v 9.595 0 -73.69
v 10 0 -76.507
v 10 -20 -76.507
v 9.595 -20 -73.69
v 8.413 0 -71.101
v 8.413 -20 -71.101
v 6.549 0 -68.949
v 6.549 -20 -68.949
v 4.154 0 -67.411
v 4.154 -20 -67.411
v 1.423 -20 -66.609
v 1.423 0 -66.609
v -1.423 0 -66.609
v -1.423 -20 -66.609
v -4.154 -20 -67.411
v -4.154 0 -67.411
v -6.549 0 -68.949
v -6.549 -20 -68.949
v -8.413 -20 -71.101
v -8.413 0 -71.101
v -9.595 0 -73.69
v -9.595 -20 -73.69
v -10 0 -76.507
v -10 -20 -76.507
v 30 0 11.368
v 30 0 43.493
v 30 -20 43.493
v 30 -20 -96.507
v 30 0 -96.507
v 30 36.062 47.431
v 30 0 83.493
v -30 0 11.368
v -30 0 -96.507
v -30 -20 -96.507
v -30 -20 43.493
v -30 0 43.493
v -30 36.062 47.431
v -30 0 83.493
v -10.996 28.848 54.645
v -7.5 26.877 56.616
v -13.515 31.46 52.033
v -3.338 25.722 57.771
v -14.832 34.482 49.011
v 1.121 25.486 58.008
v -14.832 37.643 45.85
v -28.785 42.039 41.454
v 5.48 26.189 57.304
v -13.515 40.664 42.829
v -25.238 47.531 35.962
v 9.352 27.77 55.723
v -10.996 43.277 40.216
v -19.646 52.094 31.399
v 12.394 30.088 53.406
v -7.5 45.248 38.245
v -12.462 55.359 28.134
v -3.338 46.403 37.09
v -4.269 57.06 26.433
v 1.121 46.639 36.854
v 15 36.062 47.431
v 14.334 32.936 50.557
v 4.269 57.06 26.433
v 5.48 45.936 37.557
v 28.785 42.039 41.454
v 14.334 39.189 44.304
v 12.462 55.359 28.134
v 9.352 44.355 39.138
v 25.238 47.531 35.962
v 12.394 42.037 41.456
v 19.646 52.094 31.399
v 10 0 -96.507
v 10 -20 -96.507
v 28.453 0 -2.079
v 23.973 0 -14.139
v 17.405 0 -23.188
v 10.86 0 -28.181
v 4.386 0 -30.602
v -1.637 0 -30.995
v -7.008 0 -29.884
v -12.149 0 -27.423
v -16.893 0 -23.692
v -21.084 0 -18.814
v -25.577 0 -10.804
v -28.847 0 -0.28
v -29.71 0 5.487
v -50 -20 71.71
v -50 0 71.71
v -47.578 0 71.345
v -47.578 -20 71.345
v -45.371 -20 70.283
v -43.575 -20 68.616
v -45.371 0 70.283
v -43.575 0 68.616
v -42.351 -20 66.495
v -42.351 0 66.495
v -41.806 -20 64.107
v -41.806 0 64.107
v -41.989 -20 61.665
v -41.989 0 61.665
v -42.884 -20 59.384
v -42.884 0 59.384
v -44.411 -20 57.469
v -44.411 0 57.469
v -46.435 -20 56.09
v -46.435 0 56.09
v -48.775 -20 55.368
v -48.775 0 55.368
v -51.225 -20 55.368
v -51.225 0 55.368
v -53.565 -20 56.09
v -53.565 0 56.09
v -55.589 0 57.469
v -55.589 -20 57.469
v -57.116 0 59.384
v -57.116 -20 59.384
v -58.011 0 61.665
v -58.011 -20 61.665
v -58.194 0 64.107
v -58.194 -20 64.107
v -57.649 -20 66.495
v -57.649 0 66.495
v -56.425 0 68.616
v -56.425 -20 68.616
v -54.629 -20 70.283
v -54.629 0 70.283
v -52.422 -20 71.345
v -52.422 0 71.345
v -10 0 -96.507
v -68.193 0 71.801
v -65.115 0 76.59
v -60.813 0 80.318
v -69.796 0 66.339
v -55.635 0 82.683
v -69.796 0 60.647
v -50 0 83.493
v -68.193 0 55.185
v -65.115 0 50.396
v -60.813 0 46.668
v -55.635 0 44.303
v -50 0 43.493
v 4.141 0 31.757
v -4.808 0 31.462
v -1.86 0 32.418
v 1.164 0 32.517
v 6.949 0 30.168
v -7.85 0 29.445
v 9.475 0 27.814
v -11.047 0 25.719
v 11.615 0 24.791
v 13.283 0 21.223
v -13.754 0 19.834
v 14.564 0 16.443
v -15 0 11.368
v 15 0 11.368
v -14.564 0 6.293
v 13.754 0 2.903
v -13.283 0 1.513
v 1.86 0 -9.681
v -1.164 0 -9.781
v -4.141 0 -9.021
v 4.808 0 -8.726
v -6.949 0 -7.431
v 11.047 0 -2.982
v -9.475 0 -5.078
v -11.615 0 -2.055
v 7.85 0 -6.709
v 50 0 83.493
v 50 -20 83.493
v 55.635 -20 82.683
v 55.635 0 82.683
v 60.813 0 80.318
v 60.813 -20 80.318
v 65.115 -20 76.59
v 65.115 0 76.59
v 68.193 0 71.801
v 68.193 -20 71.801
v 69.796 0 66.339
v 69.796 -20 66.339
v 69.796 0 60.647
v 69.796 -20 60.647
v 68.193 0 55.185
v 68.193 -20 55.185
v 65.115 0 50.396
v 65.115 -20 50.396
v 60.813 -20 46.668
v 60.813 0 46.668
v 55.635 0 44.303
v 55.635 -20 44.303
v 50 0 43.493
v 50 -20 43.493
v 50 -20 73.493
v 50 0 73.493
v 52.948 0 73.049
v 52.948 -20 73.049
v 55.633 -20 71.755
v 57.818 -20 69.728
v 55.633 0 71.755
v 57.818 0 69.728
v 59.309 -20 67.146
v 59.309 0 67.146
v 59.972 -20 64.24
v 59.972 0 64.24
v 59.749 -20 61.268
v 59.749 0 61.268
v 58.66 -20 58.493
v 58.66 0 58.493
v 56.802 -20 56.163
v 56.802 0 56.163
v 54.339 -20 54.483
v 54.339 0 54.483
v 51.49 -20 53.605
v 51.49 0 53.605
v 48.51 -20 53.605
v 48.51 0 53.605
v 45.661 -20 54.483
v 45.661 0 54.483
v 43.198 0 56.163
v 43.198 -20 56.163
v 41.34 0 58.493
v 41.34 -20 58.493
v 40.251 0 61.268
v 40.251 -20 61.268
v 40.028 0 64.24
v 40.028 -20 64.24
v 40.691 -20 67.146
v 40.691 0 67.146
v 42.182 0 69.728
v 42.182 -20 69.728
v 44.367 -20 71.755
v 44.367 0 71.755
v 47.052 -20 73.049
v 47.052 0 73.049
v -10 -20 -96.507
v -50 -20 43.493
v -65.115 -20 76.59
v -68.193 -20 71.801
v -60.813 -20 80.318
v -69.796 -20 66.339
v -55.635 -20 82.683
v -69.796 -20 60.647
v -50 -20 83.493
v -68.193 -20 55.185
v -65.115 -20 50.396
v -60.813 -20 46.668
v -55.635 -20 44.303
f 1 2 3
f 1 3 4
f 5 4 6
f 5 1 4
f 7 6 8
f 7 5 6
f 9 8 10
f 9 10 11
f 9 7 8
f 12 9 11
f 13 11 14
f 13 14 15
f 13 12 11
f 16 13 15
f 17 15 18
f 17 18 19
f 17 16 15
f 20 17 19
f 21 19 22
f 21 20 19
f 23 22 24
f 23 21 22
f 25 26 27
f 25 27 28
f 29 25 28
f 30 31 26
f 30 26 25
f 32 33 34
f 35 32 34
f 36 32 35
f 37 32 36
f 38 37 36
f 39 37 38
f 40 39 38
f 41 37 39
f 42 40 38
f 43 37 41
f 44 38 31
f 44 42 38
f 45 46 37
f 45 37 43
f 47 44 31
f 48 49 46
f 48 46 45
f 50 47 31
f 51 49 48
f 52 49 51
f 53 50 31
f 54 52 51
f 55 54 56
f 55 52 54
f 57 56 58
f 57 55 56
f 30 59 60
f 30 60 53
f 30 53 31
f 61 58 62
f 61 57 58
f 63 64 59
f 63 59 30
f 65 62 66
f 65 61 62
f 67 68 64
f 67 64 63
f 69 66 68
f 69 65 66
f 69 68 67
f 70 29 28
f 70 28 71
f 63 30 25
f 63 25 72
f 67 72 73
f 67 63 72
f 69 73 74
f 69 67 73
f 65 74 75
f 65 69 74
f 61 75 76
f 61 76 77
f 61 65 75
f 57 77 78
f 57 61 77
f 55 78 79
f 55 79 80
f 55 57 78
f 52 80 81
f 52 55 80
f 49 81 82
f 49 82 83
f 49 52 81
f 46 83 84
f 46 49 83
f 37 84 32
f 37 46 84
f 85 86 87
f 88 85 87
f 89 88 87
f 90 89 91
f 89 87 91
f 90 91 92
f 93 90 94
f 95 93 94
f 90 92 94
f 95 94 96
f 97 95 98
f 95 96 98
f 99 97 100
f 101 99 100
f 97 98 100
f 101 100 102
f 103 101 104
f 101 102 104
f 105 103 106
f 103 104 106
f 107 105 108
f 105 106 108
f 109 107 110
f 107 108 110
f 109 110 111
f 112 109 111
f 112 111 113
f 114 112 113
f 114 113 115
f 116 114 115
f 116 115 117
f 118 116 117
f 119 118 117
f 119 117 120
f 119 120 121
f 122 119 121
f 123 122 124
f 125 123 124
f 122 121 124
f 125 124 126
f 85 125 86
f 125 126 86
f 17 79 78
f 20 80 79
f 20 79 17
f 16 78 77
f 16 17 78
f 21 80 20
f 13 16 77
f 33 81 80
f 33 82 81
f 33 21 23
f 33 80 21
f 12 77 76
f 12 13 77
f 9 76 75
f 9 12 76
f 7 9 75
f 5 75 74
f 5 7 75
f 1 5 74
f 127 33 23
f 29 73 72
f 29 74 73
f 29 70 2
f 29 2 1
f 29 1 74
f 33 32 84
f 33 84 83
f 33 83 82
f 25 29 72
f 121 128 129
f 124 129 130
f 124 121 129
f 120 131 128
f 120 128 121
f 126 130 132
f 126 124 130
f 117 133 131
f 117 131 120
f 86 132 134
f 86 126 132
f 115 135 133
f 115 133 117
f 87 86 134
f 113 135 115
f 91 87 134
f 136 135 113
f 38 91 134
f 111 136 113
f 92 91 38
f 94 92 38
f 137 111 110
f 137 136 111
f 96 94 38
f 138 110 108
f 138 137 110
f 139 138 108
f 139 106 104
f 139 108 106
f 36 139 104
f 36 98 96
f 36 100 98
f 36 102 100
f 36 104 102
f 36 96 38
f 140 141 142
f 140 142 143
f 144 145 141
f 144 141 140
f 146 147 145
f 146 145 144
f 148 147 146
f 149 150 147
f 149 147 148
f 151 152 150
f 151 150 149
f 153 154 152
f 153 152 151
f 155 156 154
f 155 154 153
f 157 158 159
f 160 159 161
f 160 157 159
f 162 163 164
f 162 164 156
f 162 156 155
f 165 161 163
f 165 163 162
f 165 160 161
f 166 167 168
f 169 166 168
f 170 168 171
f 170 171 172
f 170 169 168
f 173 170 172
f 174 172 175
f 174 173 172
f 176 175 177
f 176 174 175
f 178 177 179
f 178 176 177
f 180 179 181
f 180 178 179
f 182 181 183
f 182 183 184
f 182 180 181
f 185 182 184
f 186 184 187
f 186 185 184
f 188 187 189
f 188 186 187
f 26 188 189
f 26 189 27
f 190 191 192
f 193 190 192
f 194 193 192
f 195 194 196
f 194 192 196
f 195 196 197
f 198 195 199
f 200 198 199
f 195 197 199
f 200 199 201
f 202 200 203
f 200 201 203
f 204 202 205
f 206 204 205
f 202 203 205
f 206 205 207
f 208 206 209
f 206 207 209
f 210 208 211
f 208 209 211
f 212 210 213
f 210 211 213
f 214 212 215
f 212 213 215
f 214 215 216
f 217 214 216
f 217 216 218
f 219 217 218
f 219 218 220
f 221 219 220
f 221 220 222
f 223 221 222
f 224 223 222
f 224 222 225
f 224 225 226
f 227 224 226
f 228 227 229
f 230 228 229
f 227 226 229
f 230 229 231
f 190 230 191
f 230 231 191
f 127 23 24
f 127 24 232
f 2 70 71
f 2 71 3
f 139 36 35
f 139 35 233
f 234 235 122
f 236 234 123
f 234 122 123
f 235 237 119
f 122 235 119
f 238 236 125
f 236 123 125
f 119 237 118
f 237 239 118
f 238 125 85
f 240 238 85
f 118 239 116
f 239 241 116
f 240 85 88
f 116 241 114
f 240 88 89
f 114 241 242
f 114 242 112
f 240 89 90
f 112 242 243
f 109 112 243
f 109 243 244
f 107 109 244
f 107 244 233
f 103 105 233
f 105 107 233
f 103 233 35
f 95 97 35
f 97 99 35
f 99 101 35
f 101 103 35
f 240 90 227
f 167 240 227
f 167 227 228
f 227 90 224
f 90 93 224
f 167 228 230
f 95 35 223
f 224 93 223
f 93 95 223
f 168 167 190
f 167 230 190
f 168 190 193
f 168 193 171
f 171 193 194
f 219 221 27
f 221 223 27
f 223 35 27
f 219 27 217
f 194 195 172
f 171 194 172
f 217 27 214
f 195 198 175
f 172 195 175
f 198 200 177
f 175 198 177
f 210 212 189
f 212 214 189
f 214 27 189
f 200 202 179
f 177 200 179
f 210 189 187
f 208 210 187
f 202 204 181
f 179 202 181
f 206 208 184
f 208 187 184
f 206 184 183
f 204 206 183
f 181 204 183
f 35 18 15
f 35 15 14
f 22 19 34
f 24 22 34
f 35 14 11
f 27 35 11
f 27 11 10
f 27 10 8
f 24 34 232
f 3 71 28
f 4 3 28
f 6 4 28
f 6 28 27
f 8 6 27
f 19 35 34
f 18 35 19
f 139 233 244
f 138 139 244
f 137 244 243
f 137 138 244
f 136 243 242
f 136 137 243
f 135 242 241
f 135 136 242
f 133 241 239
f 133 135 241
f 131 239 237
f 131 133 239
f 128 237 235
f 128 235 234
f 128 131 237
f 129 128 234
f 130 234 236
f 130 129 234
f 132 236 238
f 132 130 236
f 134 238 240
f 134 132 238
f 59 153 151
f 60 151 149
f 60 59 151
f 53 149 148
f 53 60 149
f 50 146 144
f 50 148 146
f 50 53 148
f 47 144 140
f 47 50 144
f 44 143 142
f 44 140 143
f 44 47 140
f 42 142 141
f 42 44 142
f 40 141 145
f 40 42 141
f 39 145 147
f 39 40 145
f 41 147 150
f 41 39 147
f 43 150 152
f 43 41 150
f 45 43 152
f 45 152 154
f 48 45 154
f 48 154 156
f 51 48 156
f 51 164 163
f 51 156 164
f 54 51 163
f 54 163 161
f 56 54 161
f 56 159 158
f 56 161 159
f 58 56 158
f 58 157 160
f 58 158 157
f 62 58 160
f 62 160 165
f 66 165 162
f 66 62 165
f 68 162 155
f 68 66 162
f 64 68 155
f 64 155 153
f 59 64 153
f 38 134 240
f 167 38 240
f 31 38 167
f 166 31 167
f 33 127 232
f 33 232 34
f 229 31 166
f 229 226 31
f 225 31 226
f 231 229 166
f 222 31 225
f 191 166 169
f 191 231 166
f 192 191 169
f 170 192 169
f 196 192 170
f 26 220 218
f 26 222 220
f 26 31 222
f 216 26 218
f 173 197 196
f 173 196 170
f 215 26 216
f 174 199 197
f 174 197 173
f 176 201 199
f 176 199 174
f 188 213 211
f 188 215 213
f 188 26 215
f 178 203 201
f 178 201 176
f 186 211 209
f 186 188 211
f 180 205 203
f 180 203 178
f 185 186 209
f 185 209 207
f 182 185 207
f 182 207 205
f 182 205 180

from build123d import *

# Parameters (mm, degrees)
SKETCH1_R           = 20
SKETCH1_R_2         = 8.217303111
SKETCH1_R_3         = 10
BOSS_EXTRUDE1_DEPTH = 20
CUT_EXTRUDE1_DEPTH  = 20
BOSS_EXTRUDE2_REACH = 168.813


with BuildPart() as part:
    # Sketch1 → Boss-Extrude1 (new body)
    # profile 1 of 3: a face of its own
    with BuildSketch(Plane(origin=(0, 0, 0), x_dir=(1, 0, 0), z_dir=(0, 1, 0))):
        with Locations((-50, -63.493082487)):
            Circle(SKETCH1_R)
        with Locations(Location((-50, -63.493082487, 0), (0, 0, 270))):
            Circle(SKETCH1_R_2, mode=Mode.SUBTRACT)
    # profile 2 of 3: a face of its own
    with BuildSketch(Plane(origin=(0, 0, 0), x_dir=(1, 0, 0), z_dir=(0, 1, 0))):
        with Locations((50, -63.493082487)):
            Circle(SKETCH1_R)
        with Locations(Location((50, -63.493082487, 0), (0, 0, 270))):
            Circle(SKETCH1_R_3, mode=Mode.SUBTRACT)
    # profile 3 of 3: a face of its own
    with BuildSketch(Plane(origin=(0, 0, 0), x_dir=(1, 0, 0), z_dir=(0, 1, 0))):
        with BuildLine():
            Line((50, -43.493082487), (30, -43.493082487))
            Line((30, -43.493082487), (30, 96.506917513))
            Line((30, 96.506917513), (-30, 96.506917513))
            Line((-30, 96.506917513), (-30, -43.493082487))
            Line((-30, -43.493082487), (-50, -43.493082487))
            ThreePointArc((-50, -43.493082487), (-35.857864376, -49.350946863), (-30, -63.493082487))
            ThreePointArc((-30, -63.493082487), (-35.857864376, -77.635218111), (-50, -83.493082487))
            Line((-50, -83.493082487), (50, -83.493082487))
            ThreePointArc((50, -83.493082487), (30, -63.493082487), (50, -43.493082487))
        make_face()
    extrude(amount=-BOSS_EXTRUDE1_DEPTH)

    # Sketch2 → Cut-Extrude1 (cut)
    with BuildSketch(Plane(origin=(0, 0, 0), x_dir=(1, 0, 0), z_dir=(0, 1, 0))):
        with BuildLine():
            Line((-10, 96.506917513), (10, 96.506917513))
            Line((10, 96.506917513), (10, 76.506917513))
            ThreePointArc((10, 76.506917513), (0, 66.506917513), (-10, 76.506917513))
            Line((-10, 76.506917513), (-10, 96.506917513))
        make_face()
    extrude(amount=-CUT_EXTRUDE1_DEPTH, mode=Mode.SUBTRACT)

    # Sketch5 → Boss-Extrude2 (add, up to next)
    with BuildSketch(Plane(origin=(0, 41.746541244, 41.746541244), x_dir=(1, 0, 0), z_dir=(0, 0.7071067811865511, 0.707106781186544)), mode=Mode.PRIVATE) as boss_extrude2_sk1:
        with BuildLine():
            Line((-30, -8.038524809), (-30, -59.038524809))
            Line((-30, -59.038524809), (30, -59.038524809))
            Line((30, -59.038524809), (30, -8.038524809))
            ThreePointArc((30, -8.038524809), (0, -38.038524809), (-30, -8.038524809))
        make_face()
    boss_extrude2_tool1 = extrude(boss_extrude2_sk1.sketch, amount=-BOSS_EXTRUDE2_REACH, mode=Mode.PRIVATE) - part.part
    # Sketch5 → Boss-Extrude2 (add, up to next)
    with BuildSketch(Plane(origin=(0, 41.746541244, 41.746541244), x_dir=(1, 0, 0), z_dir=(0, 0.7071067811865511, 0.707106781186544)), mode=Mode.PRIVATE) as boss_extrude2_sk2:
        with BuildLine():
            ThreePointArc((30, -8.038524809), (0, 21.961475191), (-30, -8.038524809))
            Line((-30, -8.038524809), (-15, -8.038524809))
            ThreePointArc((-15, -8.038524809), (0, 6.961475191), (15, -8.038524809))
            Line((15, -8.038524809), (30, -8.038524809))
        make_face()
    boss_extrude2_tool2 = extrude(boss_extrude2_sk2.sketch, amount=-BOSS_EXTRUDE2_REACH, mode=Mode.PRIVATE) - part.part
    # Sketch5 → Boss-Extrude2 (add, up to next)
    with BuildSketch(Plane(origin=(0, 41.746541244, 41.746541244), x_dir=(1, 0, 0), z_dir=(0, 0.7071067811865511, 0.707106781186544)), mode=Mode.PRIVATE) as boss_extrude2_sk3:
        with BuildLine():
            Line((-15, -8.038524809), (-30, -8.038524809))
            ThreePointArc((-30, -8.038524809), (0, -38.038524809), (30, -8.038524809))
            Line((30, -8.038524809), (15, -8.038524809))
            ThreePointArc((15, -8.038524809), (0, -23.038524809), (-15, -8.038524809))
        make_face()
    boss_extrude2_tool3 = extrude(boss_extrude2_sk3.sketch, amount=-BOSS_EXTRUDE2_REACH, mode=Mode.PRIVATE) - part.part
    # Sketch5 → Boss-Extrude2 (add, up to next)
    with BuildSketch(Plane(origin=(0, 41.746541244, 41.746541244), x_dir=(1, 0, 0), z_dir=(0, 0.7071067811865511, 0.707106781186544)), mode=Mode.PRIVATE) as boss_extrude2_sk4:
        with BuildLine():
            ThreePointArc((30, -8.038524809), (0, 21.961475191), (-30, -8.038524809))
            Line((-30, -8.038524809), (-15, -8.038524809))
            ThreePointArc((-15, -8.038524809), (0, 6.961475191), (15, -8.038524809))
            Line((15, -8.038524809), (30, -8.038524809))
        make_face()
    boss_extrude2_tool4 = extrude(boss_extrude2_sk4.sketch, amount=-BOSS_EXTRUDE2_REACH, mode=Mode.PRIVATE) - part.part
    # Sketch5 → Boss-Extrude2 (add, up to next)
    with BuildSketch(Plane(origin=(0, 41.746541244, 41.746541244), x_dir=(1, 0, 0), z_dir=(0, 0.7071067811865511, 0.707106781186544)), mode=Mode.PRIVATE) as boss_extrude2_sk5:
        with BuildLine():
            Line((-15, -8.038524809), (-30, -8.038524809))
            ThreePointArc((-30, -8.038524809), (0, -38.038524809), (30, -8.038524809))
            Line((30, -8.038524809), (15, -8.038524809))
            ThreePointArc((15, -8.038524809), (0, -23.038524809), (-15, -8.038524809))
        make_face()
    boss_extrude2_tool5 = extrude(boss_extrude2_sk5.sketch, amount=-BOSS_EXTRUDE2_REACH, mode=Mode.PRIVATE) - part.part
    add(boss_extrude2_tool1.solids().sort_by_distance((0, 10.278536, 73.214546))[0])
    add(boss_extrude2_tool2.solids().sort_by_distance((0, 47.143389, 36.349693))[0])
    add(boss_extrude2_tool3.solids().sort_by_distance((22.5, 35.588104, 47.904978))[0])
    add(boss_extrude2_tool4.solids().sort_by_distance((0, 47.143389, 36.349693))[0])
    add(boss_extrude2_tool5.solids().sort_by_distance((22.5, 35.588104, 47.904978))[0])


solid = part.part
